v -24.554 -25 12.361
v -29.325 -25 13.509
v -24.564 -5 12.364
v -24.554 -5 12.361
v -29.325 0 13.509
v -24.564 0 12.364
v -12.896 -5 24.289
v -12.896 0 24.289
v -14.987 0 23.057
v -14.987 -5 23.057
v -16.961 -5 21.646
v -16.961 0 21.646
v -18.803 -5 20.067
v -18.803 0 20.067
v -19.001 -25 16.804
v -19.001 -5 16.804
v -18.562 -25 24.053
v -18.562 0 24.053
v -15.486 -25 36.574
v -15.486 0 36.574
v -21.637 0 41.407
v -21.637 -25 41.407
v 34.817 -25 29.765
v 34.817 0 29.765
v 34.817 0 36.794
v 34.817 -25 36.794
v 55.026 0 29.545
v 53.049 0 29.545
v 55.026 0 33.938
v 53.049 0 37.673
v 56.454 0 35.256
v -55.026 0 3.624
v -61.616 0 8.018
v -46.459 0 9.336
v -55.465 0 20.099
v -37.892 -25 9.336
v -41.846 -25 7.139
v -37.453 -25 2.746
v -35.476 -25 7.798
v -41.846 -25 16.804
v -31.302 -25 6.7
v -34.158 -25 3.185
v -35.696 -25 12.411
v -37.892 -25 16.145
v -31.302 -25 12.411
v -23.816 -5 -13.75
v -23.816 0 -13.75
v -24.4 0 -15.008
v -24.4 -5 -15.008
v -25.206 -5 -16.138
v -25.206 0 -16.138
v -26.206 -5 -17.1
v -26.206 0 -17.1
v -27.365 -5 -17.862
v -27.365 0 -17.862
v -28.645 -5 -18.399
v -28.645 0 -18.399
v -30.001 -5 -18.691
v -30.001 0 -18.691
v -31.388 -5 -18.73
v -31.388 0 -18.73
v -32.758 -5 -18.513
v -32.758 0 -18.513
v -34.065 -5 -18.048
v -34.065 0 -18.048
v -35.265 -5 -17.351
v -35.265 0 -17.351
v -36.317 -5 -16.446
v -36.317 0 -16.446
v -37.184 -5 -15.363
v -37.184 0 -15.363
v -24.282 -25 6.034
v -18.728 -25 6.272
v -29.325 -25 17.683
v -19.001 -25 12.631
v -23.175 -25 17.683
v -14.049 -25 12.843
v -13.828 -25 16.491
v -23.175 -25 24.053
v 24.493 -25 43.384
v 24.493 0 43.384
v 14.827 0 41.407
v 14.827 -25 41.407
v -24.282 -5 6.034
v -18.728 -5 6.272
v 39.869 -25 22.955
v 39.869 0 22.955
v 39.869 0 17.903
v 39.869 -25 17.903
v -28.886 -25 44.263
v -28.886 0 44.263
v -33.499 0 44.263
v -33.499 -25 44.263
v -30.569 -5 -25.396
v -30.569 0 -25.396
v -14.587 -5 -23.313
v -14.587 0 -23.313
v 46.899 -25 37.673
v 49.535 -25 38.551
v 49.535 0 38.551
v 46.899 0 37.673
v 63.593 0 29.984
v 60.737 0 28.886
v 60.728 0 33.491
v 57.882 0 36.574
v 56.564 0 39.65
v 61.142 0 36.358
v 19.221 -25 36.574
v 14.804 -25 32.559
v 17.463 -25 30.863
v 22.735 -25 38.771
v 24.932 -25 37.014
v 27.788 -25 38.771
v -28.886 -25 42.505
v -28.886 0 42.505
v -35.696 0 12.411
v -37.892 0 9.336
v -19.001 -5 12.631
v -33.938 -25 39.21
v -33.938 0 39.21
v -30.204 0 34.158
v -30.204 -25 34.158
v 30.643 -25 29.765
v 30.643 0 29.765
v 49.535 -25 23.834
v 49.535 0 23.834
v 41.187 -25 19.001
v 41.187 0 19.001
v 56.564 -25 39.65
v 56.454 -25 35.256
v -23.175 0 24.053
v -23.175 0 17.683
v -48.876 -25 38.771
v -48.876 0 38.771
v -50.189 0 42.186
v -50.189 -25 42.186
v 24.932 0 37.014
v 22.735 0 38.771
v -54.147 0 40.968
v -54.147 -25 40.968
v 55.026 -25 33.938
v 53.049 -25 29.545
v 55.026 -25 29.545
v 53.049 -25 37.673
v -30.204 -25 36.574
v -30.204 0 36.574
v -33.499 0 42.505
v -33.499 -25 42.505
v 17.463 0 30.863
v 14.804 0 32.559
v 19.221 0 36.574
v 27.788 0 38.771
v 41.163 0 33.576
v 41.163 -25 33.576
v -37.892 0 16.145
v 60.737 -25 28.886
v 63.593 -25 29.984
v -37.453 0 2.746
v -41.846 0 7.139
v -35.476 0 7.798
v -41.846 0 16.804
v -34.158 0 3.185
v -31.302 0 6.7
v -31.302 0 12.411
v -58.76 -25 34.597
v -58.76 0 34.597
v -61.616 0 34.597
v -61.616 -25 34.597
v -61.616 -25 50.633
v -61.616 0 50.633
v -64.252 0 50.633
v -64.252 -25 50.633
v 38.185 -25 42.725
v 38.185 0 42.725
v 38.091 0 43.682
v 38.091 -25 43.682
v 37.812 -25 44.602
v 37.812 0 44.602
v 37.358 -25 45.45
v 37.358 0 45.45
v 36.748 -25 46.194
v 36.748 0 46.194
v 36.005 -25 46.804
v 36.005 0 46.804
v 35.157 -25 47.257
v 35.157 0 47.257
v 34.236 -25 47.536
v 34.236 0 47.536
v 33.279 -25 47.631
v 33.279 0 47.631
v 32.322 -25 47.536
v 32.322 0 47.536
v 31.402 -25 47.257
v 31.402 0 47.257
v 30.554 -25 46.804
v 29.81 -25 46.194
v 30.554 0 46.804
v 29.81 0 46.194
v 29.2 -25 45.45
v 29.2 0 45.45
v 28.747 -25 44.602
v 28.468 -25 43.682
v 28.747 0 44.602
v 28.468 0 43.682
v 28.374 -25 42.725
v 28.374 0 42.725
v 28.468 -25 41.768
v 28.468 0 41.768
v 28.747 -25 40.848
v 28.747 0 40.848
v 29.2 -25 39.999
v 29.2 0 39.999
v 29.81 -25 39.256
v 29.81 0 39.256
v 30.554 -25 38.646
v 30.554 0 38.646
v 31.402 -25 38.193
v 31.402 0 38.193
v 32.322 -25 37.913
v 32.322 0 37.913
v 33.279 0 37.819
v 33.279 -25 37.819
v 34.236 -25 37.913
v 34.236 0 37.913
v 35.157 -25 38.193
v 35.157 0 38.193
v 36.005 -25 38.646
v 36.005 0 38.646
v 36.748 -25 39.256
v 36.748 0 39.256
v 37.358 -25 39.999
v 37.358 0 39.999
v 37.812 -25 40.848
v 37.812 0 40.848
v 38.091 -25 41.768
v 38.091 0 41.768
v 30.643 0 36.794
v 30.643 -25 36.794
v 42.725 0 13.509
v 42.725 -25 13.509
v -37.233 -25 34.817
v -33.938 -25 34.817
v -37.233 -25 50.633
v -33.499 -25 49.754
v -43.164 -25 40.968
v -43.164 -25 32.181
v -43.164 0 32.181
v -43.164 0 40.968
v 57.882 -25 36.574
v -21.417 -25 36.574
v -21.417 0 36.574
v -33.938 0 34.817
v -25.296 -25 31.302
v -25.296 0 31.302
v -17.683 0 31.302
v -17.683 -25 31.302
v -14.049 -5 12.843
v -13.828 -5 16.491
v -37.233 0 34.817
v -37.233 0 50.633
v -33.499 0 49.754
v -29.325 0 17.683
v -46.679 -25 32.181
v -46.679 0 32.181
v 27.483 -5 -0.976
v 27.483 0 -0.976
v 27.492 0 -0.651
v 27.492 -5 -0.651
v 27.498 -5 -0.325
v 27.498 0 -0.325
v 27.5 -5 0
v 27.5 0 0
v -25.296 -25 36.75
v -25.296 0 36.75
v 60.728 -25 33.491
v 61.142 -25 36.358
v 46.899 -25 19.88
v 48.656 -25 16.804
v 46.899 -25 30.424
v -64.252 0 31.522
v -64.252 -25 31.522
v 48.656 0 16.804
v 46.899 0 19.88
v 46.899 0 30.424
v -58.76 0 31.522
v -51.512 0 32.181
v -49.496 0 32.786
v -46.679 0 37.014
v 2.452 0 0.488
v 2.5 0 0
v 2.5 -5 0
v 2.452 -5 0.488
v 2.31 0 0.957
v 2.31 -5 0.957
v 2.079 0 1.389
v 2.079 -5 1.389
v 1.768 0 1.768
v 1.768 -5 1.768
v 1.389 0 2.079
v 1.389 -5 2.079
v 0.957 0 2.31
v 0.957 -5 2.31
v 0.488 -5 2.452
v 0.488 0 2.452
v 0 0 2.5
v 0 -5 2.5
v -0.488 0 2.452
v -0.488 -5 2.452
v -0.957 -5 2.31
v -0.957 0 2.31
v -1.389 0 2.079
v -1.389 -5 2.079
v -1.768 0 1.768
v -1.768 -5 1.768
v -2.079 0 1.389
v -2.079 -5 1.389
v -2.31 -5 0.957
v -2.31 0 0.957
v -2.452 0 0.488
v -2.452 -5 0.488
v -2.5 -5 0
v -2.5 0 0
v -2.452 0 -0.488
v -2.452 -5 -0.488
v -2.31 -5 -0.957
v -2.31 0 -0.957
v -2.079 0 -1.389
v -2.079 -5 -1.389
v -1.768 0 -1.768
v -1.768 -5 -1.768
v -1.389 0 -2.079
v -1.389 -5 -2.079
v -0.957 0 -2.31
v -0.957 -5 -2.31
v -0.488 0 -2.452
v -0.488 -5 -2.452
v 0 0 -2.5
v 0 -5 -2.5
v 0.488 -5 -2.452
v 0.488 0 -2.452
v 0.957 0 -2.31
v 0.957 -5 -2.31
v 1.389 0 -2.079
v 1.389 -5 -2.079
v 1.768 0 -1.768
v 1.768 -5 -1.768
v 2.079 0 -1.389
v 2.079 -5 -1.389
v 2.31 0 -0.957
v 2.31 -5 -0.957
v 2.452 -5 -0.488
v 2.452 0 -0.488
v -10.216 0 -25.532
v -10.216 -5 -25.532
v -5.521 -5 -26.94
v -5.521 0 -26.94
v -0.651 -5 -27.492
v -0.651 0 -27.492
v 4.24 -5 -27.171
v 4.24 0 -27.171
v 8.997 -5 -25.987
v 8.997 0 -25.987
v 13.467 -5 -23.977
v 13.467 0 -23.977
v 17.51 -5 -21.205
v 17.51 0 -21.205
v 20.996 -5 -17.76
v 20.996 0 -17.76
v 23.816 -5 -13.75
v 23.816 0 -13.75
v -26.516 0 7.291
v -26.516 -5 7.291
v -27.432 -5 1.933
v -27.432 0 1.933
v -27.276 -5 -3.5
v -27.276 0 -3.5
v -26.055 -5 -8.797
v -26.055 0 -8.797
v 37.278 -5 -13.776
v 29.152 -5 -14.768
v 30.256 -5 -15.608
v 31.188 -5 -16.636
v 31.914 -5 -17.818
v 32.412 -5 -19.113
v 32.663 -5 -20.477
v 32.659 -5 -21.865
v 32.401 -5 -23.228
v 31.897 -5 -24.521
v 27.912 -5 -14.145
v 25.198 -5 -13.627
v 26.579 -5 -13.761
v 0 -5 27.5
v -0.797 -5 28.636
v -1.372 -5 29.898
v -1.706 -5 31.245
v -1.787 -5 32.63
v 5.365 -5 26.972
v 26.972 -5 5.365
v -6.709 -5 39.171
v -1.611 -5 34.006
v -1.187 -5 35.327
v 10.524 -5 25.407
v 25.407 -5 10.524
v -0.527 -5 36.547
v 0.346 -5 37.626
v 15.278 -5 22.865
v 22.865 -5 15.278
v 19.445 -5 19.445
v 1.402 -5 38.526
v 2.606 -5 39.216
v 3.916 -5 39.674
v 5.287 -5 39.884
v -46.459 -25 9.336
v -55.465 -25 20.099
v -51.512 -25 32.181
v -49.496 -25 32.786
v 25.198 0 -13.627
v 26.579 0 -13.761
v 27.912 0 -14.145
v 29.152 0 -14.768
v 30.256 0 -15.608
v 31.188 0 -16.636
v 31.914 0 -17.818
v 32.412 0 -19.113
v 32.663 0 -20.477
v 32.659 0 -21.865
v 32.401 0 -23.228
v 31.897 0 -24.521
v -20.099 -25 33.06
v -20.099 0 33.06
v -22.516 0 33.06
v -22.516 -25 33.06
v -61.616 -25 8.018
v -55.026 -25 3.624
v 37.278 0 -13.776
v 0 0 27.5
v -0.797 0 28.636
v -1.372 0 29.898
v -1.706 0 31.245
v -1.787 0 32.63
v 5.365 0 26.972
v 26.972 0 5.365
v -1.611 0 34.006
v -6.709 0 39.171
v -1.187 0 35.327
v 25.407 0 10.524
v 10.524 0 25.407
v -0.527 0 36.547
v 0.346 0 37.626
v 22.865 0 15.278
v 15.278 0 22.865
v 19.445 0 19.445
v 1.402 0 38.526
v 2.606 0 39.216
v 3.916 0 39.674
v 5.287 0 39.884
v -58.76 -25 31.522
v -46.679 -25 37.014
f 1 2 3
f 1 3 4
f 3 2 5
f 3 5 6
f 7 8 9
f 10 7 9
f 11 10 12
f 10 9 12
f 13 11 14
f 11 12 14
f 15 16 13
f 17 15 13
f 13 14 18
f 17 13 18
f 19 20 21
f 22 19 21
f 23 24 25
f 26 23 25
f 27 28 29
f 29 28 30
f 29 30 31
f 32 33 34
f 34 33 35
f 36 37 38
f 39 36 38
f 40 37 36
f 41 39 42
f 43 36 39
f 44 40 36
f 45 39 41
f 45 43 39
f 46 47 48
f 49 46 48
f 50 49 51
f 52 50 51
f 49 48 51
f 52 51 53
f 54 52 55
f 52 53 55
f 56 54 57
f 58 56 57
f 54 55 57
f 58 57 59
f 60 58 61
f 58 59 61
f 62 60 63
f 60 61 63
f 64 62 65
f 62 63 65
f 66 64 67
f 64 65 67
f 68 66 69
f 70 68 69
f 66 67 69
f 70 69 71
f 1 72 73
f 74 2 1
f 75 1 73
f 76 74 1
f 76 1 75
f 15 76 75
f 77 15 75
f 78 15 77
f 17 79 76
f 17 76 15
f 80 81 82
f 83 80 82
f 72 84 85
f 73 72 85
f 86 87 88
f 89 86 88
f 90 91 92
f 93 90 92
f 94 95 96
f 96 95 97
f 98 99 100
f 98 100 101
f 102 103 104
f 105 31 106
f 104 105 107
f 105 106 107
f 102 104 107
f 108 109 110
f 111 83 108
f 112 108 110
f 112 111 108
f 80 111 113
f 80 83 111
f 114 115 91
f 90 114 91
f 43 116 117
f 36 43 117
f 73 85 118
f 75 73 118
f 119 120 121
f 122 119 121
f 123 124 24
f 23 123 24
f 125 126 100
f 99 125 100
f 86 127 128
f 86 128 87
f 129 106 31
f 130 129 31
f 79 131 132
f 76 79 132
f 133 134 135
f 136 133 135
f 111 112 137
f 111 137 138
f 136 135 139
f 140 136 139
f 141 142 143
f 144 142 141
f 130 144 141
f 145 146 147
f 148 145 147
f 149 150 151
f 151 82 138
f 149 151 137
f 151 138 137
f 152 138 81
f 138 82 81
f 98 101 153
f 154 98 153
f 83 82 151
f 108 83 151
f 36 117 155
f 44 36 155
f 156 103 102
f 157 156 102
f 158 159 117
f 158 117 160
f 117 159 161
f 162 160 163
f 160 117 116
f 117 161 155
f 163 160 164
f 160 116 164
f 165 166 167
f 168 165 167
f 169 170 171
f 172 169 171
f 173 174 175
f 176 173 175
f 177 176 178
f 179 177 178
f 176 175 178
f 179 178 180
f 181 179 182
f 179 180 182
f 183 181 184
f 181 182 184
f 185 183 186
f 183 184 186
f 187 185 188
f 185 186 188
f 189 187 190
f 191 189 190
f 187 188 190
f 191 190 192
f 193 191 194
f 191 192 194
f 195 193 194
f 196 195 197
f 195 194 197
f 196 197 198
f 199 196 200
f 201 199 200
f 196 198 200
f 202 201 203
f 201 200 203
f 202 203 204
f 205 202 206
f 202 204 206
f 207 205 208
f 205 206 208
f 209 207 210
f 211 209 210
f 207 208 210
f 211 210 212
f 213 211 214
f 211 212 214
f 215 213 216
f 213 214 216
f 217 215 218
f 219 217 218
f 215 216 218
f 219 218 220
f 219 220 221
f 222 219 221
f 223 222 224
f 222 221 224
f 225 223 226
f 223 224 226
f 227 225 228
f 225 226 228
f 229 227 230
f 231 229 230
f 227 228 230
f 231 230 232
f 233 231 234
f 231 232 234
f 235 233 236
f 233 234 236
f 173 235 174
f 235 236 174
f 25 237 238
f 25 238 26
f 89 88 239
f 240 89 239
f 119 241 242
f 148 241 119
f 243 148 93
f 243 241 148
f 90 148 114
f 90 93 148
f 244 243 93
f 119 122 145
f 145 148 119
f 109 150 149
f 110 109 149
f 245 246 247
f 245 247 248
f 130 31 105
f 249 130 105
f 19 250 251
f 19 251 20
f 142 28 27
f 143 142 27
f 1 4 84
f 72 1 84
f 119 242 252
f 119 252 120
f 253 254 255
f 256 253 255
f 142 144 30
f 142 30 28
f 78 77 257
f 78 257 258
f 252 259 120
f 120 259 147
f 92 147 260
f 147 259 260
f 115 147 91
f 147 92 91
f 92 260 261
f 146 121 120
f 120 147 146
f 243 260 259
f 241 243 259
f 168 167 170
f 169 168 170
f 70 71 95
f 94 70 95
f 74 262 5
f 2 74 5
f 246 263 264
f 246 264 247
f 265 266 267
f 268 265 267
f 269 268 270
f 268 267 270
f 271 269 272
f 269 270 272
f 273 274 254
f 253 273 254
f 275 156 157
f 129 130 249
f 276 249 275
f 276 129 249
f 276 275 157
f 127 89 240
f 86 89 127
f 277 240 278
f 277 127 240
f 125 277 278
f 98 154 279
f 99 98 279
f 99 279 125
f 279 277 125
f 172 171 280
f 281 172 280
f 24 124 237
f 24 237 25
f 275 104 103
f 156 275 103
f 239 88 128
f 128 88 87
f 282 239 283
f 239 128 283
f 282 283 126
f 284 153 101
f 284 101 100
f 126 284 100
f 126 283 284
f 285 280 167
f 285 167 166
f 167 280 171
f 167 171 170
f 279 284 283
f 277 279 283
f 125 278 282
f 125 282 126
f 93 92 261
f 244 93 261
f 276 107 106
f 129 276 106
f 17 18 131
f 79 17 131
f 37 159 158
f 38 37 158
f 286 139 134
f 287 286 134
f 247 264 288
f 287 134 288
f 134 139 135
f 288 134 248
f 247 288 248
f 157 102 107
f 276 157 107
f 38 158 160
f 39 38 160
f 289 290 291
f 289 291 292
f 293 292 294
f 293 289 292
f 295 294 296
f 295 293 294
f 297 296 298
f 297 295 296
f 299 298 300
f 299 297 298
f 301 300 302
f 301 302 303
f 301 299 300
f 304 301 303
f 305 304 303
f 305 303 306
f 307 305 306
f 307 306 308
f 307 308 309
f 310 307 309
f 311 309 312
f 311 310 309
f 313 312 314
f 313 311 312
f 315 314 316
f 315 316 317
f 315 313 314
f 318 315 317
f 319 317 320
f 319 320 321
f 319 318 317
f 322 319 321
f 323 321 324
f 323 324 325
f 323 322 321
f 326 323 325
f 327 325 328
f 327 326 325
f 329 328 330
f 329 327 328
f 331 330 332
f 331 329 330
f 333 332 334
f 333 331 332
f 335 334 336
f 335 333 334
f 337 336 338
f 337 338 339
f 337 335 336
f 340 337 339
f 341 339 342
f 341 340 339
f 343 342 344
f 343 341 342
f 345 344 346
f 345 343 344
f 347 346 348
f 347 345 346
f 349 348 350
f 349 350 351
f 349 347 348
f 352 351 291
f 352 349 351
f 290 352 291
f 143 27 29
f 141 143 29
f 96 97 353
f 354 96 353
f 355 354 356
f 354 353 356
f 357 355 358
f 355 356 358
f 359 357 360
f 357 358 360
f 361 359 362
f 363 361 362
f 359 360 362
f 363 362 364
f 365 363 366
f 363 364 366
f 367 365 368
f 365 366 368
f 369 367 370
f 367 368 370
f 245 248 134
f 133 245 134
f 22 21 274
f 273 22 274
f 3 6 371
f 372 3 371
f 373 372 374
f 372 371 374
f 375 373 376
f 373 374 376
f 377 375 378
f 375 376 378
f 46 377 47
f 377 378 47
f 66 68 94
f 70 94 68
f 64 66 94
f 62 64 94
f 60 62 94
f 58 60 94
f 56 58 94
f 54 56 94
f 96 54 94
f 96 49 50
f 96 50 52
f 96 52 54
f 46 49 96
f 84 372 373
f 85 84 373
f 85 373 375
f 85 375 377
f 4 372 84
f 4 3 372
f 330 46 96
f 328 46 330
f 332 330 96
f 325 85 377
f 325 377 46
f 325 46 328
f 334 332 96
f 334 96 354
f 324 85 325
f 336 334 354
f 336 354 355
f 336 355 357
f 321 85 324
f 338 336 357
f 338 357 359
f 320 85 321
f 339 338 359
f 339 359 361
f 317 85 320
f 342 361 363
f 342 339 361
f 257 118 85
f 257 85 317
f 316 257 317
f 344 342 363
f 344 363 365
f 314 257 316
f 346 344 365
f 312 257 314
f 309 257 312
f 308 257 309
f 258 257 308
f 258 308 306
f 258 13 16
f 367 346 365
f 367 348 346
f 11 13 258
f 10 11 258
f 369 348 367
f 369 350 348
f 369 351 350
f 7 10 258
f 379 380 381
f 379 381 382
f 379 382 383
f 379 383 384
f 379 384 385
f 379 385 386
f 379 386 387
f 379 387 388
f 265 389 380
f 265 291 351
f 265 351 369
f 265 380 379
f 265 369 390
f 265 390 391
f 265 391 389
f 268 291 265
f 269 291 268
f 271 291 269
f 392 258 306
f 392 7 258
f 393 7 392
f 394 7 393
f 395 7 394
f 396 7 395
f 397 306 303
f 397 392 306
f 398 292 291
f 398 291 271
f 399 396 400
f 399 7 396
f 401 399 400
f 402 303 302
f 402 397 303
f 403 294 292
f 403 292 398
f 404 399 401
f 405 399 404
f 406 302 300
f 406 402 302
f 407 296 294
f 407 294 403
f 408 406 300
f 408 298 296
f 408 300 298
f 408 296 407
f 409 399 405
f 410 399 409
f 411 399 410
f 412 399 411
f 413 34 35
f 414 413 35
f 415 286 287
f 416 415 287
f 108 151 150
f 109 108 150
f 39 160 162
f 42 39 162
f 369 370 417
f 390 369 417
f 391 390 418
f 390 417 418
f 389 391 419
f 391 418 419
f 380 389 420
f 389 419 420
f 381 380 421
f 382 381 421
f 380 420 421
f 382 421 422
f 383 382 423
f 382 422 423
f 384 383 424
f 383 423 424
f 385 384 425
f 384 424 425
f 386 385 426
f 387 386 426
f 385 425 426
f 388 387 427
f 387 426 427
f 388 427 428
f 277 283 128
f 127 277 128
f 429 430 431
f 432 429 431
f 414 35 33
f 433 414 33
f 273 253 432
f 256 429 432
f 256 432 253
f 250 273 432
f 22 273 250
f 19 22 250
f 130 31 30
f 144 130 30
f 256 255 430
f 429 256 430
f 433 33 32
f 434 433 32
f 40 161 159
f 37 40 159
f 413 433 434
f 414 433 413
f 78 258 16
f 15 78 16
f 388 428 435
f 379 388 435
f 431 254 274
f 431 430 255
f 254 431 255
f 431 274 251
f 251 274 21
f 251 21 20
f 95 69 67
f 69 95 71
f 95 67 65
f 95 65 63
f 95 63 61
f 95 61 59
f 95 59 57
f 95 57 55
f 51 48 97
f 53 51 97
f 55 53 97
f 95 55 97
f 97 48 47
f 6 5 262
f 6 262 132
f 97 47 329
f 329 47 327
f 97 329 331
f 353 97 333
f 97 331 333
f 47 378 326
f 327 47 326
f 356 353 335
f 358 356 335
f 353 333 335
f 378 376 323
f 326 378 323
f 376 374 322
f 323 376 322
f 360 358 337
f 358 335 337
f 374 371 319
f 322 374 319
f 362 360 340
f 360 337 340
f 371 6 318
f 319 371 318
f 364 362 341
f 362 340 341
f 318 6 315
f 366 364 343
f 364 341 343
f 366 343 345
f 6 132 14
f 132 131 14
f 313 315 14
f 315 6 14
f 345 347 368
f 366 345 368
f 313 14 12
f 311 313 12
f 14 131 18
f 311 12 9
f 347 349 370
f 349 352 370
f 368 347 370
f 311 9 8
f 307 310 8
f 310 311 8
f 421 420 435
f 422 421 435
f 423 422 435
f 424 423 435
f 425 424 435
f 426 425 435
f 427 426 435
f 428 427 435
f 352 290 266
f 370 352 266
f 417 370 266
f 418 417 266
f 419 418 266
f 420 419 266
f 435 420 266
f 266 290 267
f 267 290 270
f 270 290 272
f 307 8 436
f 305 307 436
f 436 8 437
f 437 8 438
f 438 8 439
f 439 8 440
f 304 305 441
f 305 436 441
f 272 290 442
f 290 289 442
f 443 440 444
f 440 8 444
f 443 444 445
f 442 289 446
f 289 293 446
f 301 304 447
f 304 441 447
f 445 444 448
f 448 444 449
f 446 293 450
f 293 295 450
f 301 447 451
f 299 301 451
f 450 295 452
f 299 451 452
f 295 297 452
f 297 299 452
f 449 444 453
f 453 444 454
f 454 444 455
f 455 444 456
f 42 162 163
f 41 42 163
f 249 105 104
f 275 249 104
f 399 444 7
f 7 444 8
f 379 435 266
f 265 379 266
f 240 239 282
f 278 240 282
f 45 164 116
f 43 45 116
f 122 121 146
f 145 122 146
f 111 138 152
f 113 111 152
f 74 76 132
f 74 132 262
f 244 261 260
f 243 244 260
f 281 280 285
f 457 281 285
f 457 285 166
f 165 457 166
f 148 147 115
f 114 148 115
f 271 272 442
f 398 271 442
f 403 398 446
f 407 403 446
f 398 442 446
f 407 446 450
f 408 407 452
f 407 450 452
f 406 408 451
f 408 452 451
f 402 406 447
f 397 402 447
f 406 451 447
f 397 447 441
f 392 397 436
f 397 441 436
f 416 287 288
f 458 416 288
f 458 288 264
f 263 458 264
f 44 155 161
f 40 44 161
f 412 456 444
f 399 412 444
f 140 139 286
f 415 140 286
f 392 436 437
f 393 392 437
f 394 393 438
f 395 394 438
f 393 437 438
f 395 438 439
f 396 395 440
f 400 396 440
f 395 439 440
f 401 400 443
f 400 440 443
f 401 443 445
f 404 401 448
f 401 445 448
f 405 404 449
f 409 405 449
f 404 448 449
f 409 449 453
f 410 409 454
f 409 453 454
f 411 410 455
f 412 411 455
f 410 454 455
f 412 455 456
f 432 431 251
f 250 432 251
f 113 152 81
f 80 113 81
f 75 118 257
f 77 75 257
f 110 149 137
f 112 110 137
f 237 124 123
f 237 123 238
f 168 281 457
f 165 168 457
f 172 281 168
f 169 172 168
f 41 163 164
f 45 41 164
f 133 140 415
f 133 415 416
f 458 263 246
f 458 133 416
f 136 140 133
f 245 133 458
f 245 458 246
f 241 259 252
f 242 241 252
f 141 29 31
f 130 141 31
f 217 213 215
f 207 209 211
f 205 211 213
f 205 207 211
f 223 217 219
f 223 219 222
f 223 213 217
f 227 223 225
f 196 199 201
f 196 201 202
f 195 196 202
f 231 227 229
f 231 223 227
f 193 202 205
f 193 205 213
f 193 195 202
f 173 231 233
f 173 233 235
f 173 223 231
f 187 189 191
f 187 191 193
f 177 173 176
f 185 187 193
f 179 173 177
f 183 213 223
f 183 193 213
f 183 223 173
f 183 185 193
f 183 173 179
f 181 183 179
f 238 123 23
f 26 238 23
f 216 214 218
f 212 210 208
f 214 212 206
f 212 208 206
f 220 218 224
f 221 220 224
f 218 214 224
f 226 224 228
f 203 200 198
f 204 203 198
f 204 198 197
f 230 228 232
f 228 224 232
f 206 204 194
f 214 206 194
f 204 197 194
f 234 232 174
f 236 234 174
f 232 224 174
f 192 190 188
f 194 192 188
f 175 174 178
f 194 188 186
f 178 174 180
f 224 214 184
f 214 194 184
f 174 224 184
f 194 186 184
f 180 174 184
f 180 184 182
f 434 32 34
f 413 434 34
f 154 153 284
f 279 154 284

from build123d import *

# Parameters (mm, degrees)
F0_R     = 2.5
F1_DEPTH = 5
F2_W     = 4.173642
F2_H     = 7.029285
F3_DEPTH = 25
F2_R     = 4.905722
F4_DEPTH = 25


with BuildPart() as f1:
    # F0 (on Front) → F1 (new body)
    with BuildSketch(Plane.XZ):
        with BuildLine():
            ThreePointArc((27.482668, -0.976192), (27.495667, -0.488173), (27.5, 0))
            ThreePointArc((27.5, 0), (19.445436, 19.445436), (0, 27.5))
            ThreePointArc((0, 27.5), (-6.644863, 26.685123), (-12.895927, 24.288785))
            ThreePointArc((-12.895927, 24.288785), (-26.432426, 7.587941), (-23.815699, -13.75))
            ThreePointArc((-23.815699, -13.75), (-19.787563, -19.097182), (-14.586741, -23.312593))
            ThreePointArc((-14.586741, -23.312593), (6.644863, -26.685123), (23.815699, -13.75))
            ThreePointArc((23.815699, -13.75), (26.432426, -7.587941), (27.482668, -0.976192))
        make_face()
        Circle(F0_R, mode=Mode.SUBTRACT)
        with BuildLine():
            ThreePointArc((-12.895927, 24.288785), (-6.644863, 26.685123), (0, 27.5))
            ThreePointArc((0, 27.5), (-1.18668, 35.327109), (5.287066, 39.883691))
            Line((5.287066, 39.883691), (-6.708867, 39.171108))
            Line((-6.708867, 39.171108), (-12.895927, 24.288785))
        make_face()
        with BuildLine():
            ThreePointArc((-14.586741, -23.312593), (-19.787563, -19.097182), (-23.815699, -13.75))
            ThreePointArc((-23.815699, -13.75), (-30.000833, -18.69125), (-37.183823, -15.363112))
            Line((-37.183823, -15.363112), (-30.568741, -25.395603))
            Line((-30.568741, -25.395603), (-14.586741, -23.312593))
        make_face()
        with BuildLine():
            Line((37.277608, -13.775505), (27.482668, -0.976192))
            ThreePointArc((27.482668, -0.976192), (26.432426, -7.587941), (23.815699, -13.75))
            ThreePointArc((23.815699, -13.75), (31.187514, -16.635859), (31.896757, -24.520579))
            Line((31.896757, -24.520579), (37.277608, -13.775505))
        make_face()
    extrude(amount=F1_DEPTH)

    # F2 (on Front) → F3 (join)
    with BuildSketch(Plane.XZ):
        Polygon((-61.616112, 50.632849), (-64.252093, 50.632849), (-64.252093, 31.521965), (-58.760464, 31.521965), (-58.760464, 34.597281), (-61.616112, 34.597281), align=None)
        Polygon((-50.188987, 42.185926), (-54.147493, 40.967572), (-51.511507, 32.180965), (-49.496232, 32.785548), (-46.678871, 37.013602), (-46.678871, 32.180965), (-43.164227, 32.180965), (-43.164227, 40.967572), (-48.875526, 38.770922), align=None)
        Polygon((-33.498954, 49.754187), (-37.233267, 50.632849), (-37.233267, 34.816947), (-33.938285, 34.816947), (-33.938285, 39.210252), (-30.203976, 34.15795), (-30.203976, 36.574271), (-33.498954, 42.505234), (-28.885985, 42.505234), (-28.885985, 44.262554), (-33.498954, 44.262554), align=None)
        Polygon((-22.515692, 33.059627), (-21.417364, 36.574271), (-15.486402, 36.574271), (-21.637032, 41.406907), (-25.295811, 36.750279), (-25.295811, 31.302303), (-20.099374, 31.302303), (-17.683055, 31.302303), (-20.099374, 33.059627), align=None)
        Polygon((27.787657, 38.770922), (24.492679, 43.383893), (14.827408, 41.406907), (19.22071, 36.574271), (14.803547, 32.558671), (17.463388, 30.862972), (24.932012, 37.013602), (22.735359, 38.770922), align=None)
        with Locations((32.73013, 33.279289)):
            Rectangle(F2_W, F2_H)
        Polygon((49.534522, 38.551256), (46.89854, 37.672594), (41.163491, 33.576132), (46.89854, 30.423641), (46.89854, 19.879708), (41.187238, 19.001046), (39.869245, 22.955023), (39.869245, 17.902721), (42.7249, 13.509414), (48.655856, 16.804395), (49.534522, 23.833685), align=None)
        Polygon((56.453979, 35.256278), (53.049166, 37.672594), (53.049166, 29.544981), (55.026155, 29.544981), (55.026155, 33.938285), align=None)
        Polygon((56.56381, 39.649583), (56.453979, 35.256278), (57.881802, 36.574271), (60.72833, 33.490536), (60.73745, 28.885985), (63.593097, 29.98431), (61.141679, 36.357998), align=None)
        Polygon((-29.325316, 17.683055), (-29.325316, 13.509414), (-24.553575, 12.361361), (-24.282142, 6.033914), (-18.728277, 6.272162), (-19.001046, 12.630753), (-14.049031, 12.843184), (-13.82796, 16.490876), (-19.001046, 16.804395), (-18.561717, 24.053348), (-23.174686, 24.053348), (-23.174686, 17.683055), align=None)
        Polygon((-37.89226, 16.145399), (-41.846234, 16.804395), (-41.846234, 7.139121), (-37.452929, 2.745816), (-35.475943, 7.798117), (-34.15795, 3.185146), (-31.302303, 6.699791), (-31.302303, 12.411089), (-35.695609, 12.411089), (-37.89226, 9.335774), align=None)
        Polygon((-46.459205, 9.335774), (-55.465482, 20.099374), (-61.616112, 8.017782), (-55.026151, 3.624477), align=None)
    extrude(amount=F3_DEPTH)


with BuildPart() as f4:
    # F2 (on Front) → F4 (new body)
    with BuildSketch(Plane.XZ):
        with Locations((33.279289, 42.724896)):
            Circle(F2_R)
    extrude(amount=F4_DEPTH)


solid = Compound([f1.part, f4.part])
